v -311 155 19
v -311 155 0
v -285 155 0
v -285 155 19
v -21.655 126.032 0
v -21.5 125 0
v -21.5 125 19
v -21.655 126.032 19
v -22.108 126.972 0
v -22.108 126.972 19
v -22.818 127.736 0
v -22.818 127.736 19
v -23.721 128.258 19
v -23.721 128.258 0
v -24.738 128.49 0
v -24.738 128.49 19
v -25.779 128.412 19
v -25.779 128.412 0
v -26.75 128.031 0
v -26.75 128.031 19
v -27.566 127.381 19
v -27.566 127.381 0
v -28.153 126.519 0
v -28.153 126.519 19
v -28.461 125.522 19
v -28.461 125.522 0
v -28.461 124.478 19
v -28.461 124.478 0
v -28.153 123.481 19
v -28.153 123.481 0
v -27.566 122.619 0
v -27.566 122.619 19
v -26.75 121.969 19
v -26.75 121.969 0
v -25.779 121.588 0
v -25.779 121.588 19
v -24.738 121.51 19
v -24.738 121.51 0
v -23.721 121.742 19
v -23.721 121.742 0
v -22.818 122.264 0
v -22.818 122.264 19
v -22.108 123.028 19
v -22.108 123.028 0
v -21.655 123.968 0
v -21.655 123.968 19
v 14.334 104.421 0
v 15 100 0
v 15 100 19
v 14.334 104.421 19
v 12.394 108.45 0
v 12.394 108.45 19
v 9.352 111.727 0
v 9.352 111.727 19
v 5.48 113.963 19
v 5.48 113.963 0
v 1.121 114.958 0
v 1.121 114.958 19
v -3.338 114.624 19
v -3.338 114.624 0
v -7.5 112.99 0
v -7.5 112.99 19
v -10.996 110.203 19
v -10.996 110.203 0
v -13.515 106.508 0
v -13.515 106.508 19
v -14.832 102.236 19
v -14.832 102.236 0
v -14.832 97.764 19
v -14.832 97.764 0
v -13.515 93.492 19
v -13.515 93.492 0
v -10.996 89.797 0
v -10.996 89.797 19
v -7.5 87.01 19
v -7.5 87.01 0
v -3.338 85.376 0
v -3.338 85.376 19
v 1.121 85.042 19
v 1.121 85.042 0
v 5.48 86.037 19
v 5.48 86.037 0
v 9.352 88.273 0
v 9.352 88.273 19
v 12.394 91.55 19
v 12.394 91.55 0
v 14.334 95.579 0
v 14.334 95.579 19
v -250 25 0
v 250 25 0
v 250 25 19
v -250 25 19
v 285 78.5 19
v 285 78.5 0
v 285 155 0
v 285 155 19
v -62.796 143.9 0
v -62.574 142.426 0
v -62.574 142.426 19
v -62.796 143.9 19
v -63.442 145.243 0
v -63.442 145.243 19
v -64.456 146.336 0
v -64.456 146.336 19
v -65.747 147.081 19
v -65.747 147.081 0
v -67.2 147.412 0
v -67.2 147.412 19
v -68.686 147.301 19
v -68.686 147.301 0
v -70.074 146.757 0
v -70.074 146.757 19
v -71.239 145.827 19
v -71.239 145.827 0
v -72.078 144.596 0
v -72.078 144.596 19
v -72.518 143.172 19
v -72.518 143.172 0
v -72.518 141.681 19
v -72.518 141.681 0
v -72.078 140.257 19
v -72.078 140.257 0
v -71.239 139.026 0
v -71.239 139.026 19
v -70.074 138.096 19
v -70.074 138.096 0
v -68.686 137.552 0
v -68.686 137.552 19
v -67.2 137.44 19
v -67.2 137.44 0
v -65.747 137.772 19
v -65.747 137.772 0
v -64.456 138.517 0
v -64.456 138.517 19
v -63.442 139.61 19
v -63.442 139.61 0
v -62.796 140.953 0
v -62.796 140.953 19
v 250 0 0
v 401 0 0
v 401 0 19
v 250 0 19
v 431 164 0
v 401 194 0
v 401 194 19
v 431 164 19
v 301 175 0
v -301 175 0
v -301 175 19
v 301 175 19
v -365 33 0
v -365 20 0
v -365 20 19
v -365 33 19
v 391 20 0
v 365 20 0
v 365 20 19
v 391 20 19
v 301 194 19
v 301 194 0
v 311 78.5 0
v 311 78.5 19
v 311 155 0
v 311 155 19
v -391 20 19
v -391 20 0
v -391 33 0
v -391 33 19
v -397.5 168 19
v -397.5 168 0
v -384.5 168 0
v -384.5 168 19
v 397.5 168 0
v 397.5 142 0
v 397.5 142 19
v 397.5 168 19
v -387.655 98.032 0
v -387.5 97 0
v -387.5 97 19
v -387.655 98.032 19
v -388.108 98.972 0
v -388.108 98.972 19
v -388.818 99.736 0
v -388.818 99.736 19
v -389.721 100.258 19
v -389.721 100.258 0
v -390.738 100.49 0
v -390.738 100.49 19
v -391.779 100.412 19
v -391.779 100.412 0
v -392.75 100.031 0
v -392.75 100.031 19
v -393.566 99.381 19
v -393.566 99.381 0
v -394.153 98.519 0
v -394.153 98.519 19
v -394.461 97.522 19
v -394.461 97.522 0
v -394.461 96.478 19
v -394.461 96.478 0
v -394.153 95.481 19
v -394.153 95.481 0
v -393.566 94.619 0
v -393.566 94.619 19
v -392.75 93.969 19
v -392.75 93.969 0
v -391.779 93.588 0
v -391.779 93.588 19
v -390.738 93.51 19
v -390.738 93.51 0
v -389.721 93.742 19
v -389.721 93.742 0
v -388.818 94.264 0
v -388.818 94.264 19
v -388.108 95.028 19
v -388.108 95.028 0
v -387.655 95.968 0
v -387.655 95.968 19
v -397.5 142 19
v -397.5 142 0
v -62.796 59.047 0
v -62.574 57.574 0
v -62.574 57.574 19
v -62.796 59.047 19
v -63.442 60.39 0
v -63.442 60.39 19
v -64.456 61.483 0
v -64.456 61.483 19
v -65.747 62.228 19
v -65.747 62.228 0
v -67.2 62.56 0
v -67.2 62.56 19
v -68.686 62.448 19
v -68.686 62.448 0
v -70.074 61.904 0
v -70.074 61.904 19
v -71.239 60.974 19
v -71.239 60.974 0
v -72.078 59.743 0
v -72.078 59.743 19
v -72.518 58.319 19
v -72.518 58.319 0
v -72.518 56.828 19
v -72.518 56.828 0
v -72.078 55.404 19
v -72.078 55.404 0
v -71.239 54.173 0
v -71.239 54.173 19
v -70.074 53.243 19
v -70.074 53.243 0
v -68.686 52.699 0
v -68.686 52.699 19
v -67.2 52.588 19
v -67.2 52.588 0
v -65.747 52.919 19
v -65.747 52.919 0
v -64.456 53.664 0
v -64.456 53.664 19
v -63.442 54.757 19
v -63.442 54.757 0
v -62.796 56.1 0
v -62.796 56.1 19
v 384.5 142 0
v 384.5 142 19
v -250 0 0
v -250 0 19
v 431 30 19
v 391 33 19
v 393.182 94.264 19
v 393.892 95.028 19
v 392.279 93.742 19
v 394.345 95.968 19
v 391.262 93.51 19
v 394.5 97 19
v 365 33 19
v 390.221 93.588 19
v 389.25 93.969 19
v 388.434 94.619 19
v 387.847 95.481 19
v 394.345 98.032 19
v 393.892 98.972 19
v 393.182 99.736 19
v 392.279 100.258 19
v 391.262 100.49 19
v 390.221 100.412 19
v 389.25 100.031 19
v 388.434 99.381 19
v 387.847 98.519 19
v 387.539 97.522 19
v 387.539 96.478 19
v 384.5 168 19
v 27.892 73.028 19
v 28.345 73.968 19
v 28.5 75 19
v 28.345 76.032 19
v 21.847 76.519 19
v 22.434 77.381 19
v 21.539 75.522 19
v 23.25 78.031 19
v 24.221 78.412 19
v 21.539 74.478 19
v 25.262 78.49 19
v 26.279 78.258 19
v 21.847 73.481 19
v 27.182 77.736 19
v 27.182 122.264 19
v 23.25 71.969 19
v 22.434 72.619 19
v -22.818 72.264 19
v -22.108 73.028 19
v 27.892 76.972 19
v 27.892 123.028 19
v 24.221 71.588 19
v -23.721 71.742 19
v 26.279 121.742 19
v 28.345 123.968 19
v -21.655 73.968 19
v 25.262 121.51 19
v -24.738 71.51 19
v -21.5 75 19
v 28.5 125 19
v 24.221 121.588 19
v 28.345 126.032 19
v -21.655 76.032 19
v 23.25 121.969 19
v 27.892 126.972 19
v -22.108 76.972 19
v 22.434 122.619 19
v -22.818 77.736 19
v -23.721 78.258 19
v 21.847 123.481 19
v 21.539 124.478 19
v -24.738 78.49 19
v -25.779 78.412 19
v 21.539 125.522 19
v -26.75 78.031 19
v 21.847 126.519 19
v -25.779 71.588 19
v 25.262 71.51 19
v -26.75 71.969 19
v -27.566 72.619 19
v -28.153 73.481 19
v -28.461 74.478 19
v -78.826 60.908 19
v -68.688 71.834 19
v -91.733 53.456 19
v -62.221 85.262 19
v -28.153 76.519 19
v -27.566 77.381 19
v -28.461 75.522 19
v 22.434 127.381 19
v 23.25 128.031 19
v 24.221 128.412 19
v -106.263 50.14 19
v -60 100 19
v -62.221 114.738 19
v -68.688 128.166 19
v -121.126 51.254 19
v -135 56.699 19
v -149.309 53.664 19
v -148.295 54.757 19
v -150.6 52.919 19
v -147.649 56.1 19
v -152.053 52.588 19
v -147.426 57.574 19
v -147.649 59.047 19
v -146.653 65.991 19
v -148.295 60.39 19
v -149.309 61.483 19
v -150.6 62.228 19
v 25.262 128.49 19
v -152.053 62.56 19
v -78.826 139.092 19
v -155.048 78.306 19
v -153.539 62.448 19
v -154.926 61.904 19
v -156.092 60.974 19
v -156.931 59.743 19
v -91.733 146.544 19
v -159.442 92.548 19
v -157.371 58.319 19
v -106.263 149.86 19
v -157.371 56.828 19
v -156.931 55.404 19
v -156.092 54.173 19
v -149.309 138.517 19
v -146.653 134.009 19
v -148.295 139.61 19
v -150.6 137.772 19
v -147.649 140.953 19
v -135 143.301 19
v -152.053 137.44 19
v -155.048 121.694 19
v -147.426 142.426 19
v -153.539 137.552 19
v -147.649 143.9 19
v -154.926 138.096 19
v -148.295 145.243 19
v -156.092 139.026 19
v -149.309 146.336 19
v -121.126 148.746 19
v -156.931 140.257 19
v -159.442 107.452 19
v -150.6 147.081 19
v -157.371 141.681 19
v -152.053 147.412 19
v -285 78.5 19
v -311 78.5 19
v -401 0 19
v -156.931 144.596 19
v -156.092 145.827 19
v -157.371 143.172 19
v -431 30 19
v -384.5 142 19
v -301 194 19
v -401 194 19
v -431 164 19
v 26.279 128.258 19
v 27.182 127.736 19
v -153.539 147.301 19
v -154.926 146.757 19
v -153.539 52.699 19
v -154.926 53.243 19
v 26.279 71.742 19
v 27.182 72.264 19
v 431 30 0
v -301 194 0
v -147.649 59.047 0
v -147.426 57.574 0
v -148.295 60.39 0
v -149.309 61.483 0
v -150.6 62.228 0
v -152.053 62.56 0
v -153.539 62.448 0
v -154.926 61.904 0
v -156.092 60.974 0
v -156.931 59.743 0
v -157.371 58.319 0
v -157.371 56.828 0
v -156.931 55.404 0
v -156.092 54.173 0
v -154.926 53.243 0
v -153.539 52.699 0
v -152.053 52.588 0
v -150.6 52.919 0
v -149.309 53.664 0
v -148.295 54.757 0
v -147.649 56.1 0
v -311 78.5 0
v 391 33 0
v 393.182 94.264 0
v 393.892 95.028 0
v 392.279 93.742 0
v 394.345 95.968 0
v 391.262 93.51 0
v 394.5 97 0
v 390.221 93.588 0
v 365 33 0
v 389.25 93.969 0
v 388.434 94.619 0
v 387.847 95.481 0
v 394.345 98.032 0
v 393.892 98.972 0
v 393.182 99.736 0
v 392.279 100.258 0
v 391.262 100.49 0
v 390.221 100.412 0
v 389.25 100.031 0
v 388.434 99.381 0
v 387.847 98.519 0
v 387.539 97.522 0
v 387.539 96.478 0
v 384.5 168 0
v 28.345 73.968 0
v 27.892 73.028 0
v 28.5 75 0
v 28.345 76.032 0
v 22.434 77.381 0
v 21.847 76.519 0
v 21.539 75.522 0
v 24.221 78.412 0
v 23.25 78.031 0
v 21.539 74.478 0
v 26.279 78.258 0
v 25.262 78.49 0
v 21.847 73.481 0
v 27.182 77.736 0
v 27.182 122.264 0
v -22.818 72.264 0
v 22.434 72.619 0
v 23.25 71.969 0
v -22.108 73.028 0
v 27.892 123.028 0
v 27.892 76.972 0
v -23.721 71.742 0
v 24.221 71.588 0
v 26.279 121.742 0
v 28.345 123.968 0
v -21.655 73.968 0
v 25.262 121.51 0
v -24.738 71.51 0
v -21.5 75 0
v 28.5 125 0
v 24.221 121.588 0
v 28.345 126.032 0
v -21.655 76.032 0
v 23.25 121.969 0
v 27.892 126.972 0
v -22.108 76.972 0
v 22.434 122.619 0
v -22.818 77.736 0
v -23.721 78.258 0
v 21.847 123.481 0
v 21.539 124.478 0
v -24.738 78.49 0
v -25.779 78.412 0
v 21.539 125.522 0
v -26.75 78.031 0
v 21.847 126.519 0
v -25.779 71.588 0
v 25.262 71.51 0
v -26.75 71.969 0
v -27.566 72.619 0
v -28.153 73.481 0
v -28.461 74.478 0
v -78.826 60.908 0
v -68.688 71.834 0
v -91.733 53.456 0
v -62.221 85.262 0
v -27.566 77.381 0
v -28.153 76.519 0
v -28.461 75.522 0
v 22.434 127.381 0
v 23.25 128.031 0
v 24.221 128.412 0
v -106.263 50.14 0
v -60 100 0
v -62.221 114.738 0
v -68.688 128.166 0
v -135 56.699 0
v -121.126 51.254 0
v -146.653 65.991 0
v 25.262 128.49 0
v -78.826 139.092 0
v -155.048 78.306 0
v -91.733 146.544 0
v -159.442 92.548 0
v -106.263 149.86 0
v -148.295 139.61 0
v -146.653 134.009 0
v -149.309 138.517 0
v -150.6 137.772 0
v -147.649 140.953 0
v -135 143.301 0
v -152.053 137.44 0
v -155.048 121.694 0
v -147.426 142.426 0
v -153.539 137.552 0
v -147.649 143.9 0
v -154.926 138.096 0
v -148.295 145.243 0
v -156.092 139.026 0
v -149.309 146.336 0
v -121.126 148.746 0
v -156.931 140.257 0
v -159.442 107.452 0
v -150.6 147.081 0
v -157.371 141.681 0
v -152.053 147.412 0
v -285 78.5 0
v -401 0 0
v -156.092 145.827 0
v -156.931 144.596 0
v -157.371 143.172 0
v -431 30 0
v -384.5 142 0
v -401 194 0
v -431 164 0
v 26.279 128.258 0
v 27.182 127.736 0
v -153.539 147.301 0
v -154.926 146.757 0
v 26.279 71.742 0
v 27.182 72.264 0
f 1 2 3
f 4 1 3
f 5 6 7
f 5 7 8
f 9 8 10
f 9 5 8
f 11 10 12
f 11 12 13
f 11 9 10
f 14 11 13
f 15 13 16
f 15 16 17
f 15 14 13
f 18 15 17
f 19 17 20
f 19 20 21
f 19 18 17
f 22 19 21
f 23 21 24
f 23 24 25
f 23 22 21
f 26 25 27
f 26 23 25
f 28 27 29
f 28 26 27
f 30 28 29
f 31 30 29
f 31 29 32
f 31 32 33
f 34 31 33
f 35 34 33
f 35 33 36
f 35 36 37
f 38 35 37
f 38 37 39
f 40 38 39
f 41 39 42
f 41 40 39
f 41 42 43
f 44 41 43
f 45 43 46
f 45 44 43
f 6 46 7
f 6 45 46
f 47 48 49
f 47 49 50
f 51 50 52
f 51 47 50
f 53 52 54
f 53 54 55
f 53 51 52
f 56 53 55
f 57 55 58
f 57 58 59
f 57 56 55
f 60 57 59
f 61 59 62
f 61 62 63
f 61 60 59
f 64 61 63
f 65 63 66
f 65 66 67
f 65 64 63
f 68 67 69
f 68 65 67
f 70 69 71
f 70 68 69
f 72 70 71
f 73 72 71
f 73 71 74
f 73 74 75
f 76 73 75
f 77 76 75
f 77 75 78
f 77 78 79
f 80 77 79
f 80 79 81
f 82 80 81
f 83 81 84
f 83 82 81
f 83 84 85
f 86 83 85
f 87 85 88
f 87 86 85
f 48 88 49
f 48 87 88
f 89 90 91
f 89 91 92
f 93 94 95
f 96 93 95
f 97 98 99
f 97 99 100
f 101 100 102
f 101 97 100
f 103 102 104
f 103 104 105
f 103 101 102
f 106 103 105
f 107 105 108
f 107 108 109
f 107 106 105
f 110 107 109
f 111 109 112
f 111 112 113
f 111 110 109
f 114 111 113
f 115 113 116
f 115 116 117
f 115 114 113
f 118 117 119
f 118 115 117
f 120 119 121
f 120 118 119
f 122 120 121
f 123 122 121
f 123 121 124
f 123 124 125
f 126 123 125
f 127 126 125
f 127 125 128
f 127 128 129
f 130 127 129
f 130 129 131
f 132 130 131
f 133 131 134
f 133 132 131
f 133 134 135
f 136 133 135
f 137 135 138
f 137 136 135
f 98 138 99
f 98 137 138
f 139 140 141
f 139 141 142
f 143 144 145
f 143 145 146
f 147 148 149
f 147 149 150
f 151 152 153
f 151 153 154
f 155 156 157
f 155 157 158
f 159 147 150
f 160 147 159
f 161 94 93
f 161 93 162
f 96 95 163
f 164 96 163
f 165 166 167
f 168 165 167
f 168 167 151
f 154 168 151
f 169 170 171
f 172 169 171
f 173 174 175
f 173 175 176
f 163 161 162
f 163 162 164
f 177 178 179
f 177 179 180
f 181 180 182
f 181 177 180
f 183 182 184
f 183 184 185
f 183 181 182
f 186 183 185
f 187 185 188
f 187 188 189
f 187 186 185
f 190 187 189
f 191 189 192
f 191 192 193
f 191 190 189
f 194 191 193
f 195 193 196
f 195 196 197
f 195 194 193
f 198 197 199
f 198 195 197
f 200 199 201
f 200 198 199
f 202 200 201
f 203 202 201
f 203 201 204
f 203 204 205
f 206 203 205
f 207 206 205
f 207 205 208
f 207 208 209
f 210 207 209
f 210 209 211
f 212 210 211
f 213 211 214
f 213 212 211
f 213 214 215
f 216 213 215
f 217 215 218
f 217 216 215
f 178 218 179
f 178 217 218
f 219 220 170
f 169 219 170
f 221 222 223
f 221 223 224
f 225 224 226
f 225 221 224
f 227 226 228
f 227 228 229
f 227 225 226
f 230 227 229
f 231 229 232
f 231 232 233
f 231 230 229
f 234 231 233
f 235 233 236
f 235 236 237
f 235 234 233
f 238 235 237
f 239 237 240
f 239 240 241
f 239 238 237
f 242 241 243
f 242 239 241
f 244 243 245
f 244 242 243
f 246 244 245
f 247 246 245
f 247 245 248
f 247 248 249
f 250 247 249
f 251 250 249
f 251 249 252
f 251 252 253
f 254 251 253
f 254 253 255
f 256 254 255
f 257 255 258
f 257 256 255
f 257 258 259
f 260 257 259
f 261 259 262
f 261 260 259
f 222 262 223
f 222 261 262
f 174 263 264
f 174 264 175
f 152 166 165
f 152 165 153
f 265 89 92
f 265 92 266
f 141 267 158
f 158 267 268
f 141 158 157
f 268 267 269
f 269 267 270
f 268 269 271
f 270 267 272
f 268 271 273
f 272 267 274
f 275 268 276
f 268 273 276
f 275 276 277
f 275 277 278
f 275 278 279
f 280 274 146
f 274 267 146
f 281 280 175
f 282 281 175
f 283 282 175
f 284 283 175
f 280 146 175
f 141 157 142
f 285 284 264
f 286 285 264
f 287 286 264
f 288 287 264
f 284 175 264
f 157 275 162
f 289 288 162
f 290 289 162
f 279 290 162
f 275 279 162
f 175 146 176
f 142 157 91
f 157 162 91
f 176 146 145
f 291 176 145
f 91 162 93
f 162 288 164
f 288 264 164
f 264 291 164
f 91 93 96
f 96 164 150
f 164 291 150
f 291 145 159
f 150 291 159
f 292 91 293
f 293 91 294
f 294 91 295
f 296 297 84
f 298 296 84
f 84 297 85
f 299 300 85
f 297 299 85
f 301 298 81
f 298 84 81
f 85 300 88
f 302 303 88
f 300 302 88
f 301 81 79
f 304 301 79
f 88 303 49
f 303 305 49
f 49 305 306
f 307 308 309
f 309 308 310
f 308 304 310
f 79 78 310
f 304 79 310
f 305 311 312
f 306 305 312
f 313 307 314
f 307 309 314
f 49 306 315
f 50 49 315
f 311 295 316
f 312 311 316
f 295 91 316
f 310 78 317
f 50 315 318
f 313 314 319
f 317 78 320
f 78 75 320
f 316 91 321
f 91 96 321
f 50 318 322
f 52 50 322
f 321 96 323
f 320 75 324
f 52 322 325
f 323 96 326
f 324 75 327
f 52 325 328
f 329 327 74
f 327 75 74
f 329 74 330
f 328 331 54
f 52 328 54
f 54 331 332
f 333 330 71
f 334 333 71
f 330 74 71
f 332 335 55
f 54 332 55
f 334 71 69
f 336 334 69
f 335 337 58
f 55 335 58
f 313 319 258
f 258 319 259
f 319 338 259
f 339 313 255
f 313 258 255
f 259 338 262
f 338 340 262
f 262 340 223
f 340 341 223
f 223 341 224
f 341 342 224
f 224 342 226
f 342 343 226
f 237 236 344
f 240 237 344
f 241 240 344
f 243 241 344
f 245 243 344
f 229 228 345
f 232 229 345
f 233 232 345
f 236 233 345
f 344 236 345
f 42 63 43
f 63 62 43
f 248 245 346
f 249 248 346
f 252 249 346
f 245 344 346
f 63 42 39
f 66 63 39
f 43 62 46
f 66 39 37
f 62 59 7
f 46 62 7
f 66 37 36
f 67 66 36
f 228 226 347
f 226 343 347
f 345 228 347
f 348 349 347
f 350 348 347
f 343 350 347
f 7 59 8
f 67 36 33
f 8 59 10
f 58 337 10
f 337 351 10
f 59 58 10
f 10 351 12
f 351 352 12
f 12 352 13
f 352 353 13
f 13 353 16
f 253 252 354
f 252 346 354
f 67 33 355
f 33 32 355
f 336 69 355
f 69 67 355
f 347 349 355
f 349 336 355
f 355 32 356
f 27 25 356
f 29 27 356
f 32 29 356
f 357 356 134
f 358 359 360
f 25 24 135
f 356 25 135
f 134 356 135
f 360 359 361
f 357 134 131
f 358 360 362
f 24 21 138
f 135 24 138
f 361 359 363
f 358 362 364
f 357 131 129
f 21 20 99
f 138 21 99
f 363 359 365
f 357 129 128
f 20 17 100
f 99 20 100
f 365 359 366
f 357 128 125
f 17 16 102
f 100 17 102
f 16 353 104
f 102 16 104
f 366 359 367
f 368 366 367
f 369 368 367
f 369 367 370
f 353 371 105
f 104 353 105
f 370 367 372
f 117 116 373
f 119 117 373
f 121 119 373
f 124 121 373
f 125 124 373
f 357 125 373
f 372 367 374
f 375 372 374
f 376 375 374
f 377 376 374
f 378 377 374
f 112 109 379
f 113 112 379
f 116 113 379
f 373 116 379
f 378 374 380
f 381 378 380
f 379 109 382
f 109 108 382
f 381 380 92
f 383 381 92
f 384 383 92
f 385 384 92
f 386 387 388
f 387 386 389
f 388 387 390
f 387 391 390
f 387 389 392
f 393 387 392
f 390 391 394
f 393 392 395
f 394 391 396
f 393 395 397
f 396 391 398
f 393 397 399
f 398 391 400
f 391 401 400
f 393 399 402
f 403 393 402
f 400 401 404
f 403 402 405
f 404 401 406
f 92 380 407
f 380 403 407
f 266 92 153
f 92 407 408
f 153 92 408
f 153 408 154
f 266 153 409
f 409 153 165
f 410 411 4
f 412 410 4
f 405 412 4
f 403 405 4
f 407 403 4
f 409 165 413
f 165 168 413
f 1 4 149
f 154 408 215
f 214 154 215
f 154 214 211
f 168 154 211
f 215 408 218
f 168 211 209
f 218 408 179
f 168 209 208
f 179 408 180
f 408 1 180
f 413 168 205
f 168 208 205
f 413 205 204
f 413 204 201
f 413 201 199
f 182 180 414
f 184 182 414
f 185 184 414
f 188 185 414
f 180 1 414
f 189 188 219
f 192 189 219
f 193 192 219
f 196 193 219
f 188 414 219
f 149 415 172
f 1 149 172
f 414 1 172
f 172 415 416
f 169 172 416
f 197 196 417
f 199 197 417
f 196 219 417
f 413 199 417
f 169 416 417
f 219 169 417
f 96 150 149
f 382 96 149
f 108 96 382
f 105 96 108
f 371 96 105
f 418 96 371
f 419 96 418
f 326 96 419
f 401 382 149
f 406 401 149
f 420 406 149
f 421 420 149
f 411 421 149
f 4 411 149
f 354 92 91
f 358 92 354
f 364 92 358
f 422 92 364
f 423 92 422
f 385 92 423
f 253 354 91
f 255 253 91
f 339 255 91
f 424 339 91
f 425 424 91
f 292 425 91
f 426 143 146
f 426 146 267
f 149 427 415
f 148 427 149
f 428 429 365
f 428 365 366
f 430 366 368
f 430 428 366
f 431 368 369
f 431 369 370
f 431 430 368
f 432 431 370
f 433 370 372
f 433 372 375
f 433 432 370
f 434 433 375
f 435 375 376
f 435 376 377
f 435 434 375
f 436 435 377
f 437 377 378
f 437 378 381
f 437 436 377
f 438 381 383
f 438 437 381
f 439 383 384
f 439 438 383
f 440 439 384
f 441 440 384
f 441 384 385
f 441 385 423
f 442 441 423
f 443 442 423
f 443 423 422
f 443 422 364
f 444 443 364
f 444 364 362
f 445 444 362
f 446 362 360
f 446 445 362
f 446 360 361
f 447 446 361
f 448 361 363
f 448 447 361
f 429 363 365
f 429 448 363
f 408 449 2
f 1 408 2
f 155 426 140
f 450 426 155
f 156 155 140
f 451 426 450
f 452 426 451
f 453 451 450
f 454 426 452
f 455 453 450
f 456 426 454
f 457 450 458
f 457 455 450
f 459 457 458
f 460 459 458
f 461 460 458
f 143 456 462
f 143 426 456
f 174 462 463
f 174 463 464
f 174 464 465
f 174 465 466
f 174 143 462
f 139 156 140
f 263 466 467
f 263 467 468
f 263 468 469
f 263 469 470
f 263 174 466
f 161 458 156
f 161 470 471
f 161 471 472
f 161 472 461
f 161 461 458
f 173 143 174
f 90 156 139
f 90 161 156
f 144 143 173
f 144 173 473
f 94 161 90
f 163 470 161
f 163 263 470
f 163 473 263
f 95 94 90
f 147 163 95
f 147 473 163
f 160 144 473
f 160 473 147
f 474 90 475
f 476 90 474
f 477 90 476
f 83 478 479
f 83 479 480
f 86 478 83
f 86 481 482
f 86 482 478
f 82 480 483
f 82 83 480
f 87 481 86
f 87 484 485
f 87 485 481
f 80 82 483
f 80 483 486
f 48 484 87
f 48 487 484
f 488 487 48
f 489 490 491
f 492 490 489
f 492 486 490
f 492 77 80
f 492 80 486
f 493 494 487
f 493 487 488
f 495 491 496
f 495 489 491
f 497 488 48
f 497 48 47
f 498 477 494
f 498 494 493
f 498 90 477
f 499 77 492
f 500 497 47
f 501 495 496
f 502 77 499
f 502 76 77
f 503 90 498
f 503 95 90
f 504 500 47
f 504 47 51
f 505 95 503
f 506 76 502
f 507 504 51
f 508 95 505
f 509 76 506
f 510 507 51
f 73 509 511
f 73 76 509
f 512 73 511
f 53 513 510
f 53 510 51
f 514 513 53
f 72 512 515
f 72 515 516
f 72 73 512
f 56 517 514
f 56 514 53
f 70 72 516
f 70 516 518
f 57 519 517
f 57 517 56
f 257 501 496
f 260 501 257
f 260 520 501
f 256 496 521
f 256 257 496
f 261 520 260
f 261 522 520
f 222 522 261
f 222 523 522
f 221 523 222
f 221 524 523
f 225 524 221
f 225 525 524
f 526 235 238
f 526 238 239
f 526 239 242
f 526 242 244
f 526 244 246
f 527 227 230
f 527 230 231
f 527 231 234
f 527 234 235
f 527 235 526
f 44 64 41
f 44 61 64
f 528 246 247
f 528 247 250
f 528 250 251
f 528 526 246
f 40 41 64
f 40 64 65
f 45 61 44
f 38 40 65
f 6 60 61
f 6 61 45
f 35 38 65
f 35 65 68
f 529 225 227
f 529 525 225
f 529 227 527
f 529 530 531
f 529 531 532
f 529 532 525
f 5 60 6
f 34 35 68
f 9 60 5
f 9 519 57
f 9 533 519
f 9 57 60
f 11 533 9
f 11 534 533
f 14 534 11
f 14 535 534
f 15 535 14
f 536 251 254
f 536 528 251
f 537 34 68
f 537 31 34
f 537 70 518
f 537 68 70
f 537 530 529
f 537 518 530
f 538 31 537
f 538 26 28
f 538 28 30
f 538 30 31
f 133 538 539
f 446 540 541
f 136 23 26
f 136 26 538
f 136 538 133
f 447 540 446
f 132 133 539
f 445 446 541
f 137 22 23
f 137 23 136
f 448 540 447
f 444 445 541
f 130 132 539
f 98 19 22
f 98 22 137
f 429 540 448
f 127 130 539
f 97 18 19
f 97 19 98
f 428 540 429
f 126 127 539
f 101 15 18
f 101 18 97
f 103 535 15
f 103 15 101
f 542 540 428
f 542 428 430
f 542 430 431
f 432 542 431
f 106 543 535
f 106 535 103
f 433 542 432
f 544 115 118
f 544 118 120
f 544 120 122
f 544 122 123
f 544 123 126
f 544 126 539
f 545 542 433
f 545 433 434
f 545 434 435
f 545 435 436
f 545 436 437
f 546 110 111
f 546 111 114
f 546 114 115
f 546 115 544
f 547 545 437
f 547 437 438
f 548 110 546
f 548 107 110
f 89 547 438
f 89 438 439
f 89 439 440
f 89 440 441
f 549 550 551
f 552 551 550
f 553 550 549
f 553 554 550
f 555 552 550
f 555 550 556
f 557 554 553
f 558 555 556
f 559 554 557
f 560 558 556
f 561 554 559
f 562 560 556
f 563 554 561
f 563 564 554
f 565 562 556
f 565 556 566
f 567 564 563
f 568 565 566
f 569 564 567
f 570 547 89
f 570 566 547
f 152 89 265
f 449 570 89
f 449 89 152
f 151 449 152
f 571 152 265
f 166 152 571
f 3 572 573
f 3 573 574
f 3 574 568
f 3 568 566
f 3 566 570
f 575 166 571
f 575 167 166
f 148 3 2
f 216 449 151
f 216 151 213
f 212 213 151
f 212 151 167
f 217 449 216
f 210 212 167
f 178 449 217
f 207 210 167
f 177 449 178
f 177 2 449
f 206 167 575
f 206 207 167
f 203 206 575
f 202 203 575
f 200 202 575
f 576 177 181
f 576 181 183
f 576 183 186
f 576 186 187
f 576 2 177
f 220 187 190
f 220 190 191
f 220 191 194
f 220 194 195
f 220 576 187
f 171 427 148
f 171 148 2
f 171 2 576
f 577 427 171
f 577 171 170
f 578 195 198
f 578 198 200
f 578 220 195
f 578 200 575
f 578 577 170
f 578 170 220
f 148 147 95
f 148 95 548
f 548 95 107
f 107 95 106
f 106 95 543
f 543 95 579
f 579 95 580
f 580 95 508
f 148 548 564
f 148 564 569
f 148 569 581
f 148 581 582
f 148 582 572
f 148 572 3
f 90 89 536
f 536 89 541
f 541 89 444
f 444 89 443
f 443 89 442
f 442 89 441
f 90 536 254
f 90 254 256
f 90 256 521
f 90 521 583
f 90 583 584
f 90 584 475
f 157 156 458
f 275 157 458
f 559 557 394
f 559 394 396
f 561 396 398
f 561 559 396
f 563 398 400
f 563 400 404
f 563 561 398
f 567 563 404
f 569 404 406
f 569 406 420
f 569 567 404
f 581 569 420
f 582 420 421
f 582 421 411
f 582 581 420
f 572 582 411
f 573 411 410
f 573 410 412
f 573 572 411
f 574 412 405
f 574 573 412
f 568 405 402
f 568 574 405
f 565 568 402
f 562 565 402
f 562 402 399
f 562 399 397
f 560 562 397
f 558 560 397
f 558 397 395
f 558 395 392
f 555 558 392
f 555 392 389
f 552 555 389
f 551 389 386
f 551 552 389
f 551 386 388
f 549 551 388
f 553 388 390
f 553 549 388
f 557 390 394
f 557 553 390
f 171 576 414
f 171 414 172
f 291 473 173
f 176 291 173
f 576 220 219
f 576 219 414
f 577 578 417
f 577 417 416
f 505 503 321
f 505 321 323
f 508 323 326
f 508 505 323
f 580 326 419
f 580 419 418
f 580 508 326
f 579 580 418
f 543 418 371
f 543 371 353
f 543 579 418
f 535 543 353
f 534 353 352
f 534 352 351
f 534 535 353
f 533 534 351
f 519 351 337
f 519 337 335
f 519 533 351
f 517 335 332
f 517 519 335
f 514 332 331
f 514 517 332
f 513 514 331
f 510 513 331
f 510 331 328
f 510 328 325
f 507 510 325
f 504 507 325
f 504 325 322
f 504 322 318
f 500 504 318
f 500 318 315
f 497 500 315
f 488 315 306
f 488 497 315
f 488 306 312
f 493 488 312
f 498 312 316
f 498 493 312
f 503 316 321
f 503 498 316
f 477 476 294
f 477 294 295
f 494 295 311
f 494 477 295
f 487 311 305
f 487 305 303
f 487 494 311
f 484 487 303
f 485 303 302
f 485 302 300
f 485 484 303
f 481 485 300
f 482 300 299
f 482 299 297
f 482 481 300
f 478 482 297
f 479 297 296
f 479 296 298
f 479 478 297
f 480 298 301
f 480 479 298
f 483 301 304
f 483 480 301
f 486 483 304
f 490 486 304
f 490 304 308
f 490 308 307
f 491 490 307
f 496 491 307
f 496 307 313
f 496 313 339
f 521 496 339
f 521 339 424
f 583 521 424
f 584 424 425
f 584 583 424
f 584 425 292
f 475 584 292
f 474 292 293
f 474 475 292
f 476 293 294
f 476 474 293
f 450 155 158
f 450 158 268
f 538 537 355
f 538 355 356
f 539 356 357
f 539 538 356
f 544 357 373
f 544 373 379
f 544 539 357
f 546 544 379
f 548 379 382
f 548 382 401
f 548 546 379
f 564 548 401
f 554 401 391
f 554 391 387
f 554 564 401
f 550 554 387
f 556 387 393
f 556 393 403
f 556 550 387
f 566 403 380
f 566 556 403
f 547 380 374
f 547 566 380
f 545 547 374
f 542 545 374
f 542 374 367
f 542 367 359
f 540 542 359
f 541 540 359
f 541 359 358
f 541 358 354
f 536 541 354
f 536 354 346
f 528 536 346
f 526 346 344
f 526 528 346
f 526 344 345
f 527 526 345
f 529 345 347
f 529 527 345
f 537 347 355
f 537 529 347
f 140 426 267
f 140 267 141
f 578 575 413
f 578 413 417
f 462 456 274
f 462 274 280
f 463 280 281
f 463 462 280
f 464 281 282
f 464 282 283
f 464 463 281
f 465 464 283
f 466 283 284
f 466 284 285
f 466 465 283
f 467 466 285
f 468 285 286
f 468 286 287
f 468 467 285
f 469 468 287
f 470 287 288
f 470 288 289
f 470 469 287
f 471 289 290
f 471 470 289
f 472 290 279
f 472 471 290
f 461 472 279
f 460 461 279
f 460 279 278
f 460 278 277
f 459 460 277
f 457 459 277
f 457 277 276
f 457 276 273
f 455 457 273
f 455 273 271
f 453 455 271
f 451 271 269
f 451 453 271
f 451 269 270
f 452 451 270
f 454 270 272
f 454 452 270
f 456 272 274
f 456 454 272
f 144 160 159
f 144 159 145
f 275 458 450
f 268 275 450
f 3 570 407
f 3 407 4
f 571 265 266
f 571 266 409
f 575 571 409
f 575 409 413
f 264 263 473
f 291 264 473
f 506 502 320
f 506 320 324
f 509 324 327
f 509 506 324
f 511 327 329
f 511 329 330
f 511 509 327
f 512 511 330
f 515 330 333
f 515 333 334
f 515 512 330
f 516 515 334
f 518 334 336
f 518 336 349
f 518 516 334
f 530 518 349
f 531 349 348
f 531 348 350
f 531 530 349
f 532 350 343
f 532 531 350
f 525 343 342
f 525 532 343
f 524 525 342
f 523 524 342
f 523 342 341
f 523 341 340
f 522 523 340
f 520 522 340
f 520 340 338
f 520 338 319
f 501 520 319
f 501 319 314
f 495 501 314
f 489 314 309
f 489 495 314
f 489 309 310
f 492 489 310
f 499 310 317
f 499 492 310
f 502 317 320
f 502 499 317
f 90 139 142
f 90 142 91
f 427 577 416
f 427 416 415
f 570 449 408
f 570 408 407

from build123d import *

# Parameters (mm, degrees)
CROQUIS1_R              = 3.5
CROQUIS1_R_2            = 15
CROQUIS1_R_3            = 50
CROQUIS1_R_4            = 5
CROQUIS1_W              = 26
CROQUIS1_H              = 76.5
CROQUIS1_H_2            = 13
CROQUIS1_W_2            = 13
CROQUIS1_H_3            = 26
SALIENTE_EXTRUIR1_DEPTH = 19


with BuildPart() as part:
    # Croquis1 → Saliente-Extruir1 (new body)
    with BuildSketch(Plane.XY):
        Polygon((-301, 194), (-301, 175), (301, 175), (301, 194), (401, 194), (431, 164), (431, 30), (401, 0), (250, 0), (250, 25), (-250, 25), (-250, 0), (-401, 0), (-431, 30), (-431, 164), (-401, 194), align=None)
        with Locations((-391, 97)):
            Circle(CROQUIS1_R, mode=Mode.SUBTRACT)
        with Locations((391, 97)):
            Circle(CROQUIS1_R, mode=Mode.SUBTRACT)
        with Locations((0, 100)):
            Circle(CROQUIS1_R_2, mode=Mode.SUBTRACT)
        with Locations((-25, 125)):
            Circle(CROQUIS1_R, mode=Mode.SUBTRACT)
        with Locations((25, 125)):
            Circle(CROQUIS1_R, mode=Mode.SUBTRACT)
        with Locations((25, 75)):
            Circle(CROQUIS1_R, mode=Mode.SUBTRACT)
        with Locations((-25, 75)):
            Circle(CROQUIS1_R, mode=Mode.SUBTRACT)
        with Locations((-110, 100)):
            Circle(CROQUIS1_R_3, mode=Mode.SUBTRACT)
        with Locations((-152.426406871, 142.426406871)):
            Circle(CROQUIS1_R_4, mode=Mode.SUBTRACT)
        with Locations((-67.573593129, 142.426406871)):
            Circle(CROQUIS1_R_4, mode=Mode.SUBTRACT)
        with Locations((-67.573593129, 57.573593129)):
            Circle(CROQUIS1_R_4, mode=Mode.SUBTRACT)
        with Locations((-152.426406871, 57.573593129)):
            Circle(CROQUIS1_R_4, mode=Mode.SUBTRACT)
        with Locations((-298, 116.75)):
            Rectangle(CROQUIS1_W, CROQUIS1_H, mode=Mode.SUBTRACT)
        with Locations((298, 116.75)):
            Rectangle(CROQUIS1_W, CROQUIS1_H, mode=Mode.SUBTRACT)
        with Locations((378, 26.5)):
            Rectangle(CROQUIS1_W, CROQUIS1_H_2, mode=Mode.SUBTRACT)
        with Locations((-378, 26.5)):
            Rectangle(CROQUIS1_W, CROQUIS1_H_2, mode=Mode.SUBTRACT)
        with Locations((391, 155)):
            Rectangle(CROQUIS1_W_2, CROQUIS1_H_3, mode=Mode.SUBTRACT)
        with Locations((-391, 155)):
            Rectangle(CROQUIS1_W_2, CROQUIS1_H_3, mode=Mode.SUBTRACT)
    extrude(amount=SALIENTE_EXTRUIR1_DEPTH)


solid = part.part
